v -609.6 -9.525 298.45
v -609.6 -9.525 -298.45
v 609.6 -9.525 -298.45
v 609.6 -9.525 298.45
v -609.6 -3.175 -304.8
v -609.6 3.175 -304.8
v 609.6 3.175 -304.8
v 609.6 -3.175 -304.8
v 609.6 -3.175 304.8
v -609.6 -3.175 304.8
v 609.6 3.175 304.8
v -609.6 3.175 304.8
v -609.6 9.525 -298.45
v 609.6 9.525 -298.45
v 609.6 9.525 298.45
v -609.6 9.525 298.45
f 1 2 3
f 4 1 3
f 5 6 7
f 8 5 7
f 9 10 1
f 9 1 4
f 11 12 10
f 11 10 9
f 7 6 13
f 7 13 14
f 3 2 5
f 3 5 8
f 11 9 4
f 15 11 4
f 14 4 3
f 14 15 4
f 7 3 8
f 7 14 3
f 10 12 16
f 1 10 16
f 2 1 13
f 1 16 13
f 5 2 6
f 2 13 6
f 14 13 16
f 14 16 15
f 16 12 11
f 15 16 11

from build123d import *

# Parameters (mm, degrees)
SKETCH1_W           = 1219.2
SKETCH1_H           = 609.6
BOSS_EXTRUDE1_DEPTH = 9.525
CHAMFER1_SIZE       = 6.35


with BuildPart() as part:
    # Sketch1 → Boss-Extrude1 (new body, symmetric)
    with BuildSketch(Plane(origin=(0, 0, 0), x_dir=(1, 0, 0), z_dir=(0, 1, 0))):
        Rectangle(SKETCH1_W, SKETCH1_H)
    extrude(amount=BOSS_EXTRUDE1_DEPTH, both=True)

    # Chamfer1
    chamfer1_edges = [part.edges().sort_by_distance(p)[0] for p in [
        (0, 9.525, 304.8),
        (0, -9.525, 304.8),
        (0, -9.525, -304.8),
        (0, 9.525, -304.8),
    ]]
    chamfer(chamfer1_edges, length=CHAMFER1_SIZE)


solid = part.part
